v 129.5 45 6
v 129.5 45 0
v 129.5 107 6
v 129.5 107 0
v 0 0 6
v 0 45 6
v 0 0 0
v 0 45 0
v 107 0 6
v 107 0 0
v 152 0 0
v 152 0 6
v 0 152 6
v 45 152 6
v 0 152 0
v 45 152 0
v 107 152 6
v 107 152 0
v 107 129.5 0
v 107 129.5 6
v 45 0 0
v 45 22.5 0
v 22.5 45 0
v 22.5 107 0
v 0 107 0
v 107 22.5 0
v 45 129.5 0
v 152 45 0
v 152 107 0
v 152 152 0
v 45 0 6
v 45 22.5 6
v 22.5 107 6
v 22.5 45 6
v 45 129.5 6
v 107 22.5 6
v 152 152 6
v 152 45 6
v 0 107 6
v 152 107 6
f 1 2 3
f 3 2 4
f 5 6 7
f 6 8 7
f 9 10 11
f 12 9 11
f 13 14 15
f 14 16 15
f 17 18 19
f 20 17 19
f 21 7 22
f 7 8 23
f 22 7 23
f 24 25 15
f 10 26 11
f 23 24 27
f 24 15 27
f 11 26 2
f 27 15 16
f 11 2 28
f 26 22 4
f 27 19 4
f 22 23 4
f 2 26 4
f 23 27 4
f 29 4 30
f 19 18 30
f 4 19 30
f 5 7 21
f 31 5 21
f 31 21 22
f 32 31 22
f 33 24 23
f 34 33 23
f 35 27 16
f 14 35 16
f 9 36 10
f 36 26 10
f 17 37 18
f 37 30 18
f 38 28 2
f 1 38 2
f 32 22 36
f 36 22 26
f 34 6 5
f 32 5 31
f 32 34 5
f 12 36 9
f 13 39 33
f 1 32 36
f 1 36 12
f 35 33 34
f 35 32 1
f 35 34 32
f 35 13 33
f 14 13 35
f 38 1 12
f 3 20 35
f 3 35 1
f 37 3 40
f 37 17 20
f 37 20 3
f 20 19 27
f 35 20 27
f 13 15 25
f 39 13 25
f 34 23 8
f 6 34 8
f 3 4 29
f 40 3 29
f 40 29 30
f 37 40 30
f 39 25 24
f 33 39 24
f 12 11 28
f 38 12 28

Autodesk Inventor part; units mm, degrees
ref_plane "YZ Plane" through (0, 0, 0) normal (1, 0, 0) x (0, 1, 0)
ref_plane "XZ Plane" through (0, 0, 0) normal (0, 1, 0) x (-1, 0, 0)
ref_plane "XY Plane" through (0, 0, 0) normal (0, 0, 1) x (1, 0, 0)
sketch "Szkic1" plane through (0, 0, 0) normal (0, 0, 1) x (1, 0, 0)
  line L0 (0, 0) -> (152, 0) construction
  line L1 (152, 0) -> (152, 152) construction
  line L2 (152, 152) -> (0, 152) construction
  line L3 (0, 152) -> (0, 0) construction
  line L4 (129.5, 22.5) -> (22.5, 22.5) construction
  line L5 (22.5, 22.5) -> (22.5, 129.5) construction
  line L6 (22.5, 129.5) -> (129.5, 129.5) construction
  line L7 (129.5, 129.5) -> (129.5, 22.5) construction
  line L8 (0, 0) -> (45, 0) construction
  line L9 (45, 0) -> (45, 45) construction
  line L10 (45, 45) -> (0, 45) construction
  line L11 (0, 45) -> (0, 0) construction
  line L12 (0, 152) -> (45, 152) construction
  line L13 (45, 152) -> (45, 107) construction
  line L14 (45, 107) -> (0, 107) construction
  line L15 (0, 107) -> (0, 152) construction
  line L16 (152, 152) -> (107, 152) construction
  line L17 (107, 152) -> (107, 107) construction
  line L18 (107, 107) -> (152, 107) construction
  line L19 (152, 107) -> (152, 152) construction
  line L20 (152, 0) -> (107, 0) construction
  line L21 (107, 0) -> (107, 45) construction
  line L22 (107, 45) -> (152, 45) construction
  line L23 (152, 45) -> (152, 0) construction
  line L24 (0, 0) -> (45, 0)
  line L25 (45, 0) -> (45, 22.5)
  line L26 (45, 22.5) -> (107, 22.5)
  line L27 (107, 22.5) -> (107, 0)
  line L28 (107, 0) -> (152, 0)
  line L29 (152, 0) -> (152, 45)
  line L30 (152, 45) -> (129.5, 45)
  line L31 (129.5, 45) -> (129.5, 107)
  line L32 (129.5, 107) -> (152, 107)
  line L33 (152, 107) -> (152, 152)
  line L34 (152, 152) -> (107, 152)
  line L35 (107, 152) -> (107, 129.5)
  line L36 (107, 129.5) -> (45, 129.5)
  line L37 (45, 129.5) -> (45, 152)
  line L38 (45, 152) -> (0, 152)
  line L39 (0, 152) -> (0, 107)
  line L40 (0, 107) -> (22.5, 107)
  line L41 (22.5, 107) -> (22.5, 45)
  line L42 (22.5, 45) -> (0, 45)
  line L43 (0, 45) -> (0, 0)
  dimension "d0" = 152
  dimension "d1" = 152
  dimension "d2" = 22.5
  dimension "d3" = 45
  dimension "d4" = 45
  dimension "d5" = 45
  dimension "d6" = 45
  dimension "d7" = 45
  dimension "d8" = 45
  dimension "d9" = 45
  dimension "d10" = 45
extrude "Wyciągnięcie proste1" add sketch "Szkic1" along normal blind 6
equation "\"d1\" = d0"
properties part number "Pokrywka"
